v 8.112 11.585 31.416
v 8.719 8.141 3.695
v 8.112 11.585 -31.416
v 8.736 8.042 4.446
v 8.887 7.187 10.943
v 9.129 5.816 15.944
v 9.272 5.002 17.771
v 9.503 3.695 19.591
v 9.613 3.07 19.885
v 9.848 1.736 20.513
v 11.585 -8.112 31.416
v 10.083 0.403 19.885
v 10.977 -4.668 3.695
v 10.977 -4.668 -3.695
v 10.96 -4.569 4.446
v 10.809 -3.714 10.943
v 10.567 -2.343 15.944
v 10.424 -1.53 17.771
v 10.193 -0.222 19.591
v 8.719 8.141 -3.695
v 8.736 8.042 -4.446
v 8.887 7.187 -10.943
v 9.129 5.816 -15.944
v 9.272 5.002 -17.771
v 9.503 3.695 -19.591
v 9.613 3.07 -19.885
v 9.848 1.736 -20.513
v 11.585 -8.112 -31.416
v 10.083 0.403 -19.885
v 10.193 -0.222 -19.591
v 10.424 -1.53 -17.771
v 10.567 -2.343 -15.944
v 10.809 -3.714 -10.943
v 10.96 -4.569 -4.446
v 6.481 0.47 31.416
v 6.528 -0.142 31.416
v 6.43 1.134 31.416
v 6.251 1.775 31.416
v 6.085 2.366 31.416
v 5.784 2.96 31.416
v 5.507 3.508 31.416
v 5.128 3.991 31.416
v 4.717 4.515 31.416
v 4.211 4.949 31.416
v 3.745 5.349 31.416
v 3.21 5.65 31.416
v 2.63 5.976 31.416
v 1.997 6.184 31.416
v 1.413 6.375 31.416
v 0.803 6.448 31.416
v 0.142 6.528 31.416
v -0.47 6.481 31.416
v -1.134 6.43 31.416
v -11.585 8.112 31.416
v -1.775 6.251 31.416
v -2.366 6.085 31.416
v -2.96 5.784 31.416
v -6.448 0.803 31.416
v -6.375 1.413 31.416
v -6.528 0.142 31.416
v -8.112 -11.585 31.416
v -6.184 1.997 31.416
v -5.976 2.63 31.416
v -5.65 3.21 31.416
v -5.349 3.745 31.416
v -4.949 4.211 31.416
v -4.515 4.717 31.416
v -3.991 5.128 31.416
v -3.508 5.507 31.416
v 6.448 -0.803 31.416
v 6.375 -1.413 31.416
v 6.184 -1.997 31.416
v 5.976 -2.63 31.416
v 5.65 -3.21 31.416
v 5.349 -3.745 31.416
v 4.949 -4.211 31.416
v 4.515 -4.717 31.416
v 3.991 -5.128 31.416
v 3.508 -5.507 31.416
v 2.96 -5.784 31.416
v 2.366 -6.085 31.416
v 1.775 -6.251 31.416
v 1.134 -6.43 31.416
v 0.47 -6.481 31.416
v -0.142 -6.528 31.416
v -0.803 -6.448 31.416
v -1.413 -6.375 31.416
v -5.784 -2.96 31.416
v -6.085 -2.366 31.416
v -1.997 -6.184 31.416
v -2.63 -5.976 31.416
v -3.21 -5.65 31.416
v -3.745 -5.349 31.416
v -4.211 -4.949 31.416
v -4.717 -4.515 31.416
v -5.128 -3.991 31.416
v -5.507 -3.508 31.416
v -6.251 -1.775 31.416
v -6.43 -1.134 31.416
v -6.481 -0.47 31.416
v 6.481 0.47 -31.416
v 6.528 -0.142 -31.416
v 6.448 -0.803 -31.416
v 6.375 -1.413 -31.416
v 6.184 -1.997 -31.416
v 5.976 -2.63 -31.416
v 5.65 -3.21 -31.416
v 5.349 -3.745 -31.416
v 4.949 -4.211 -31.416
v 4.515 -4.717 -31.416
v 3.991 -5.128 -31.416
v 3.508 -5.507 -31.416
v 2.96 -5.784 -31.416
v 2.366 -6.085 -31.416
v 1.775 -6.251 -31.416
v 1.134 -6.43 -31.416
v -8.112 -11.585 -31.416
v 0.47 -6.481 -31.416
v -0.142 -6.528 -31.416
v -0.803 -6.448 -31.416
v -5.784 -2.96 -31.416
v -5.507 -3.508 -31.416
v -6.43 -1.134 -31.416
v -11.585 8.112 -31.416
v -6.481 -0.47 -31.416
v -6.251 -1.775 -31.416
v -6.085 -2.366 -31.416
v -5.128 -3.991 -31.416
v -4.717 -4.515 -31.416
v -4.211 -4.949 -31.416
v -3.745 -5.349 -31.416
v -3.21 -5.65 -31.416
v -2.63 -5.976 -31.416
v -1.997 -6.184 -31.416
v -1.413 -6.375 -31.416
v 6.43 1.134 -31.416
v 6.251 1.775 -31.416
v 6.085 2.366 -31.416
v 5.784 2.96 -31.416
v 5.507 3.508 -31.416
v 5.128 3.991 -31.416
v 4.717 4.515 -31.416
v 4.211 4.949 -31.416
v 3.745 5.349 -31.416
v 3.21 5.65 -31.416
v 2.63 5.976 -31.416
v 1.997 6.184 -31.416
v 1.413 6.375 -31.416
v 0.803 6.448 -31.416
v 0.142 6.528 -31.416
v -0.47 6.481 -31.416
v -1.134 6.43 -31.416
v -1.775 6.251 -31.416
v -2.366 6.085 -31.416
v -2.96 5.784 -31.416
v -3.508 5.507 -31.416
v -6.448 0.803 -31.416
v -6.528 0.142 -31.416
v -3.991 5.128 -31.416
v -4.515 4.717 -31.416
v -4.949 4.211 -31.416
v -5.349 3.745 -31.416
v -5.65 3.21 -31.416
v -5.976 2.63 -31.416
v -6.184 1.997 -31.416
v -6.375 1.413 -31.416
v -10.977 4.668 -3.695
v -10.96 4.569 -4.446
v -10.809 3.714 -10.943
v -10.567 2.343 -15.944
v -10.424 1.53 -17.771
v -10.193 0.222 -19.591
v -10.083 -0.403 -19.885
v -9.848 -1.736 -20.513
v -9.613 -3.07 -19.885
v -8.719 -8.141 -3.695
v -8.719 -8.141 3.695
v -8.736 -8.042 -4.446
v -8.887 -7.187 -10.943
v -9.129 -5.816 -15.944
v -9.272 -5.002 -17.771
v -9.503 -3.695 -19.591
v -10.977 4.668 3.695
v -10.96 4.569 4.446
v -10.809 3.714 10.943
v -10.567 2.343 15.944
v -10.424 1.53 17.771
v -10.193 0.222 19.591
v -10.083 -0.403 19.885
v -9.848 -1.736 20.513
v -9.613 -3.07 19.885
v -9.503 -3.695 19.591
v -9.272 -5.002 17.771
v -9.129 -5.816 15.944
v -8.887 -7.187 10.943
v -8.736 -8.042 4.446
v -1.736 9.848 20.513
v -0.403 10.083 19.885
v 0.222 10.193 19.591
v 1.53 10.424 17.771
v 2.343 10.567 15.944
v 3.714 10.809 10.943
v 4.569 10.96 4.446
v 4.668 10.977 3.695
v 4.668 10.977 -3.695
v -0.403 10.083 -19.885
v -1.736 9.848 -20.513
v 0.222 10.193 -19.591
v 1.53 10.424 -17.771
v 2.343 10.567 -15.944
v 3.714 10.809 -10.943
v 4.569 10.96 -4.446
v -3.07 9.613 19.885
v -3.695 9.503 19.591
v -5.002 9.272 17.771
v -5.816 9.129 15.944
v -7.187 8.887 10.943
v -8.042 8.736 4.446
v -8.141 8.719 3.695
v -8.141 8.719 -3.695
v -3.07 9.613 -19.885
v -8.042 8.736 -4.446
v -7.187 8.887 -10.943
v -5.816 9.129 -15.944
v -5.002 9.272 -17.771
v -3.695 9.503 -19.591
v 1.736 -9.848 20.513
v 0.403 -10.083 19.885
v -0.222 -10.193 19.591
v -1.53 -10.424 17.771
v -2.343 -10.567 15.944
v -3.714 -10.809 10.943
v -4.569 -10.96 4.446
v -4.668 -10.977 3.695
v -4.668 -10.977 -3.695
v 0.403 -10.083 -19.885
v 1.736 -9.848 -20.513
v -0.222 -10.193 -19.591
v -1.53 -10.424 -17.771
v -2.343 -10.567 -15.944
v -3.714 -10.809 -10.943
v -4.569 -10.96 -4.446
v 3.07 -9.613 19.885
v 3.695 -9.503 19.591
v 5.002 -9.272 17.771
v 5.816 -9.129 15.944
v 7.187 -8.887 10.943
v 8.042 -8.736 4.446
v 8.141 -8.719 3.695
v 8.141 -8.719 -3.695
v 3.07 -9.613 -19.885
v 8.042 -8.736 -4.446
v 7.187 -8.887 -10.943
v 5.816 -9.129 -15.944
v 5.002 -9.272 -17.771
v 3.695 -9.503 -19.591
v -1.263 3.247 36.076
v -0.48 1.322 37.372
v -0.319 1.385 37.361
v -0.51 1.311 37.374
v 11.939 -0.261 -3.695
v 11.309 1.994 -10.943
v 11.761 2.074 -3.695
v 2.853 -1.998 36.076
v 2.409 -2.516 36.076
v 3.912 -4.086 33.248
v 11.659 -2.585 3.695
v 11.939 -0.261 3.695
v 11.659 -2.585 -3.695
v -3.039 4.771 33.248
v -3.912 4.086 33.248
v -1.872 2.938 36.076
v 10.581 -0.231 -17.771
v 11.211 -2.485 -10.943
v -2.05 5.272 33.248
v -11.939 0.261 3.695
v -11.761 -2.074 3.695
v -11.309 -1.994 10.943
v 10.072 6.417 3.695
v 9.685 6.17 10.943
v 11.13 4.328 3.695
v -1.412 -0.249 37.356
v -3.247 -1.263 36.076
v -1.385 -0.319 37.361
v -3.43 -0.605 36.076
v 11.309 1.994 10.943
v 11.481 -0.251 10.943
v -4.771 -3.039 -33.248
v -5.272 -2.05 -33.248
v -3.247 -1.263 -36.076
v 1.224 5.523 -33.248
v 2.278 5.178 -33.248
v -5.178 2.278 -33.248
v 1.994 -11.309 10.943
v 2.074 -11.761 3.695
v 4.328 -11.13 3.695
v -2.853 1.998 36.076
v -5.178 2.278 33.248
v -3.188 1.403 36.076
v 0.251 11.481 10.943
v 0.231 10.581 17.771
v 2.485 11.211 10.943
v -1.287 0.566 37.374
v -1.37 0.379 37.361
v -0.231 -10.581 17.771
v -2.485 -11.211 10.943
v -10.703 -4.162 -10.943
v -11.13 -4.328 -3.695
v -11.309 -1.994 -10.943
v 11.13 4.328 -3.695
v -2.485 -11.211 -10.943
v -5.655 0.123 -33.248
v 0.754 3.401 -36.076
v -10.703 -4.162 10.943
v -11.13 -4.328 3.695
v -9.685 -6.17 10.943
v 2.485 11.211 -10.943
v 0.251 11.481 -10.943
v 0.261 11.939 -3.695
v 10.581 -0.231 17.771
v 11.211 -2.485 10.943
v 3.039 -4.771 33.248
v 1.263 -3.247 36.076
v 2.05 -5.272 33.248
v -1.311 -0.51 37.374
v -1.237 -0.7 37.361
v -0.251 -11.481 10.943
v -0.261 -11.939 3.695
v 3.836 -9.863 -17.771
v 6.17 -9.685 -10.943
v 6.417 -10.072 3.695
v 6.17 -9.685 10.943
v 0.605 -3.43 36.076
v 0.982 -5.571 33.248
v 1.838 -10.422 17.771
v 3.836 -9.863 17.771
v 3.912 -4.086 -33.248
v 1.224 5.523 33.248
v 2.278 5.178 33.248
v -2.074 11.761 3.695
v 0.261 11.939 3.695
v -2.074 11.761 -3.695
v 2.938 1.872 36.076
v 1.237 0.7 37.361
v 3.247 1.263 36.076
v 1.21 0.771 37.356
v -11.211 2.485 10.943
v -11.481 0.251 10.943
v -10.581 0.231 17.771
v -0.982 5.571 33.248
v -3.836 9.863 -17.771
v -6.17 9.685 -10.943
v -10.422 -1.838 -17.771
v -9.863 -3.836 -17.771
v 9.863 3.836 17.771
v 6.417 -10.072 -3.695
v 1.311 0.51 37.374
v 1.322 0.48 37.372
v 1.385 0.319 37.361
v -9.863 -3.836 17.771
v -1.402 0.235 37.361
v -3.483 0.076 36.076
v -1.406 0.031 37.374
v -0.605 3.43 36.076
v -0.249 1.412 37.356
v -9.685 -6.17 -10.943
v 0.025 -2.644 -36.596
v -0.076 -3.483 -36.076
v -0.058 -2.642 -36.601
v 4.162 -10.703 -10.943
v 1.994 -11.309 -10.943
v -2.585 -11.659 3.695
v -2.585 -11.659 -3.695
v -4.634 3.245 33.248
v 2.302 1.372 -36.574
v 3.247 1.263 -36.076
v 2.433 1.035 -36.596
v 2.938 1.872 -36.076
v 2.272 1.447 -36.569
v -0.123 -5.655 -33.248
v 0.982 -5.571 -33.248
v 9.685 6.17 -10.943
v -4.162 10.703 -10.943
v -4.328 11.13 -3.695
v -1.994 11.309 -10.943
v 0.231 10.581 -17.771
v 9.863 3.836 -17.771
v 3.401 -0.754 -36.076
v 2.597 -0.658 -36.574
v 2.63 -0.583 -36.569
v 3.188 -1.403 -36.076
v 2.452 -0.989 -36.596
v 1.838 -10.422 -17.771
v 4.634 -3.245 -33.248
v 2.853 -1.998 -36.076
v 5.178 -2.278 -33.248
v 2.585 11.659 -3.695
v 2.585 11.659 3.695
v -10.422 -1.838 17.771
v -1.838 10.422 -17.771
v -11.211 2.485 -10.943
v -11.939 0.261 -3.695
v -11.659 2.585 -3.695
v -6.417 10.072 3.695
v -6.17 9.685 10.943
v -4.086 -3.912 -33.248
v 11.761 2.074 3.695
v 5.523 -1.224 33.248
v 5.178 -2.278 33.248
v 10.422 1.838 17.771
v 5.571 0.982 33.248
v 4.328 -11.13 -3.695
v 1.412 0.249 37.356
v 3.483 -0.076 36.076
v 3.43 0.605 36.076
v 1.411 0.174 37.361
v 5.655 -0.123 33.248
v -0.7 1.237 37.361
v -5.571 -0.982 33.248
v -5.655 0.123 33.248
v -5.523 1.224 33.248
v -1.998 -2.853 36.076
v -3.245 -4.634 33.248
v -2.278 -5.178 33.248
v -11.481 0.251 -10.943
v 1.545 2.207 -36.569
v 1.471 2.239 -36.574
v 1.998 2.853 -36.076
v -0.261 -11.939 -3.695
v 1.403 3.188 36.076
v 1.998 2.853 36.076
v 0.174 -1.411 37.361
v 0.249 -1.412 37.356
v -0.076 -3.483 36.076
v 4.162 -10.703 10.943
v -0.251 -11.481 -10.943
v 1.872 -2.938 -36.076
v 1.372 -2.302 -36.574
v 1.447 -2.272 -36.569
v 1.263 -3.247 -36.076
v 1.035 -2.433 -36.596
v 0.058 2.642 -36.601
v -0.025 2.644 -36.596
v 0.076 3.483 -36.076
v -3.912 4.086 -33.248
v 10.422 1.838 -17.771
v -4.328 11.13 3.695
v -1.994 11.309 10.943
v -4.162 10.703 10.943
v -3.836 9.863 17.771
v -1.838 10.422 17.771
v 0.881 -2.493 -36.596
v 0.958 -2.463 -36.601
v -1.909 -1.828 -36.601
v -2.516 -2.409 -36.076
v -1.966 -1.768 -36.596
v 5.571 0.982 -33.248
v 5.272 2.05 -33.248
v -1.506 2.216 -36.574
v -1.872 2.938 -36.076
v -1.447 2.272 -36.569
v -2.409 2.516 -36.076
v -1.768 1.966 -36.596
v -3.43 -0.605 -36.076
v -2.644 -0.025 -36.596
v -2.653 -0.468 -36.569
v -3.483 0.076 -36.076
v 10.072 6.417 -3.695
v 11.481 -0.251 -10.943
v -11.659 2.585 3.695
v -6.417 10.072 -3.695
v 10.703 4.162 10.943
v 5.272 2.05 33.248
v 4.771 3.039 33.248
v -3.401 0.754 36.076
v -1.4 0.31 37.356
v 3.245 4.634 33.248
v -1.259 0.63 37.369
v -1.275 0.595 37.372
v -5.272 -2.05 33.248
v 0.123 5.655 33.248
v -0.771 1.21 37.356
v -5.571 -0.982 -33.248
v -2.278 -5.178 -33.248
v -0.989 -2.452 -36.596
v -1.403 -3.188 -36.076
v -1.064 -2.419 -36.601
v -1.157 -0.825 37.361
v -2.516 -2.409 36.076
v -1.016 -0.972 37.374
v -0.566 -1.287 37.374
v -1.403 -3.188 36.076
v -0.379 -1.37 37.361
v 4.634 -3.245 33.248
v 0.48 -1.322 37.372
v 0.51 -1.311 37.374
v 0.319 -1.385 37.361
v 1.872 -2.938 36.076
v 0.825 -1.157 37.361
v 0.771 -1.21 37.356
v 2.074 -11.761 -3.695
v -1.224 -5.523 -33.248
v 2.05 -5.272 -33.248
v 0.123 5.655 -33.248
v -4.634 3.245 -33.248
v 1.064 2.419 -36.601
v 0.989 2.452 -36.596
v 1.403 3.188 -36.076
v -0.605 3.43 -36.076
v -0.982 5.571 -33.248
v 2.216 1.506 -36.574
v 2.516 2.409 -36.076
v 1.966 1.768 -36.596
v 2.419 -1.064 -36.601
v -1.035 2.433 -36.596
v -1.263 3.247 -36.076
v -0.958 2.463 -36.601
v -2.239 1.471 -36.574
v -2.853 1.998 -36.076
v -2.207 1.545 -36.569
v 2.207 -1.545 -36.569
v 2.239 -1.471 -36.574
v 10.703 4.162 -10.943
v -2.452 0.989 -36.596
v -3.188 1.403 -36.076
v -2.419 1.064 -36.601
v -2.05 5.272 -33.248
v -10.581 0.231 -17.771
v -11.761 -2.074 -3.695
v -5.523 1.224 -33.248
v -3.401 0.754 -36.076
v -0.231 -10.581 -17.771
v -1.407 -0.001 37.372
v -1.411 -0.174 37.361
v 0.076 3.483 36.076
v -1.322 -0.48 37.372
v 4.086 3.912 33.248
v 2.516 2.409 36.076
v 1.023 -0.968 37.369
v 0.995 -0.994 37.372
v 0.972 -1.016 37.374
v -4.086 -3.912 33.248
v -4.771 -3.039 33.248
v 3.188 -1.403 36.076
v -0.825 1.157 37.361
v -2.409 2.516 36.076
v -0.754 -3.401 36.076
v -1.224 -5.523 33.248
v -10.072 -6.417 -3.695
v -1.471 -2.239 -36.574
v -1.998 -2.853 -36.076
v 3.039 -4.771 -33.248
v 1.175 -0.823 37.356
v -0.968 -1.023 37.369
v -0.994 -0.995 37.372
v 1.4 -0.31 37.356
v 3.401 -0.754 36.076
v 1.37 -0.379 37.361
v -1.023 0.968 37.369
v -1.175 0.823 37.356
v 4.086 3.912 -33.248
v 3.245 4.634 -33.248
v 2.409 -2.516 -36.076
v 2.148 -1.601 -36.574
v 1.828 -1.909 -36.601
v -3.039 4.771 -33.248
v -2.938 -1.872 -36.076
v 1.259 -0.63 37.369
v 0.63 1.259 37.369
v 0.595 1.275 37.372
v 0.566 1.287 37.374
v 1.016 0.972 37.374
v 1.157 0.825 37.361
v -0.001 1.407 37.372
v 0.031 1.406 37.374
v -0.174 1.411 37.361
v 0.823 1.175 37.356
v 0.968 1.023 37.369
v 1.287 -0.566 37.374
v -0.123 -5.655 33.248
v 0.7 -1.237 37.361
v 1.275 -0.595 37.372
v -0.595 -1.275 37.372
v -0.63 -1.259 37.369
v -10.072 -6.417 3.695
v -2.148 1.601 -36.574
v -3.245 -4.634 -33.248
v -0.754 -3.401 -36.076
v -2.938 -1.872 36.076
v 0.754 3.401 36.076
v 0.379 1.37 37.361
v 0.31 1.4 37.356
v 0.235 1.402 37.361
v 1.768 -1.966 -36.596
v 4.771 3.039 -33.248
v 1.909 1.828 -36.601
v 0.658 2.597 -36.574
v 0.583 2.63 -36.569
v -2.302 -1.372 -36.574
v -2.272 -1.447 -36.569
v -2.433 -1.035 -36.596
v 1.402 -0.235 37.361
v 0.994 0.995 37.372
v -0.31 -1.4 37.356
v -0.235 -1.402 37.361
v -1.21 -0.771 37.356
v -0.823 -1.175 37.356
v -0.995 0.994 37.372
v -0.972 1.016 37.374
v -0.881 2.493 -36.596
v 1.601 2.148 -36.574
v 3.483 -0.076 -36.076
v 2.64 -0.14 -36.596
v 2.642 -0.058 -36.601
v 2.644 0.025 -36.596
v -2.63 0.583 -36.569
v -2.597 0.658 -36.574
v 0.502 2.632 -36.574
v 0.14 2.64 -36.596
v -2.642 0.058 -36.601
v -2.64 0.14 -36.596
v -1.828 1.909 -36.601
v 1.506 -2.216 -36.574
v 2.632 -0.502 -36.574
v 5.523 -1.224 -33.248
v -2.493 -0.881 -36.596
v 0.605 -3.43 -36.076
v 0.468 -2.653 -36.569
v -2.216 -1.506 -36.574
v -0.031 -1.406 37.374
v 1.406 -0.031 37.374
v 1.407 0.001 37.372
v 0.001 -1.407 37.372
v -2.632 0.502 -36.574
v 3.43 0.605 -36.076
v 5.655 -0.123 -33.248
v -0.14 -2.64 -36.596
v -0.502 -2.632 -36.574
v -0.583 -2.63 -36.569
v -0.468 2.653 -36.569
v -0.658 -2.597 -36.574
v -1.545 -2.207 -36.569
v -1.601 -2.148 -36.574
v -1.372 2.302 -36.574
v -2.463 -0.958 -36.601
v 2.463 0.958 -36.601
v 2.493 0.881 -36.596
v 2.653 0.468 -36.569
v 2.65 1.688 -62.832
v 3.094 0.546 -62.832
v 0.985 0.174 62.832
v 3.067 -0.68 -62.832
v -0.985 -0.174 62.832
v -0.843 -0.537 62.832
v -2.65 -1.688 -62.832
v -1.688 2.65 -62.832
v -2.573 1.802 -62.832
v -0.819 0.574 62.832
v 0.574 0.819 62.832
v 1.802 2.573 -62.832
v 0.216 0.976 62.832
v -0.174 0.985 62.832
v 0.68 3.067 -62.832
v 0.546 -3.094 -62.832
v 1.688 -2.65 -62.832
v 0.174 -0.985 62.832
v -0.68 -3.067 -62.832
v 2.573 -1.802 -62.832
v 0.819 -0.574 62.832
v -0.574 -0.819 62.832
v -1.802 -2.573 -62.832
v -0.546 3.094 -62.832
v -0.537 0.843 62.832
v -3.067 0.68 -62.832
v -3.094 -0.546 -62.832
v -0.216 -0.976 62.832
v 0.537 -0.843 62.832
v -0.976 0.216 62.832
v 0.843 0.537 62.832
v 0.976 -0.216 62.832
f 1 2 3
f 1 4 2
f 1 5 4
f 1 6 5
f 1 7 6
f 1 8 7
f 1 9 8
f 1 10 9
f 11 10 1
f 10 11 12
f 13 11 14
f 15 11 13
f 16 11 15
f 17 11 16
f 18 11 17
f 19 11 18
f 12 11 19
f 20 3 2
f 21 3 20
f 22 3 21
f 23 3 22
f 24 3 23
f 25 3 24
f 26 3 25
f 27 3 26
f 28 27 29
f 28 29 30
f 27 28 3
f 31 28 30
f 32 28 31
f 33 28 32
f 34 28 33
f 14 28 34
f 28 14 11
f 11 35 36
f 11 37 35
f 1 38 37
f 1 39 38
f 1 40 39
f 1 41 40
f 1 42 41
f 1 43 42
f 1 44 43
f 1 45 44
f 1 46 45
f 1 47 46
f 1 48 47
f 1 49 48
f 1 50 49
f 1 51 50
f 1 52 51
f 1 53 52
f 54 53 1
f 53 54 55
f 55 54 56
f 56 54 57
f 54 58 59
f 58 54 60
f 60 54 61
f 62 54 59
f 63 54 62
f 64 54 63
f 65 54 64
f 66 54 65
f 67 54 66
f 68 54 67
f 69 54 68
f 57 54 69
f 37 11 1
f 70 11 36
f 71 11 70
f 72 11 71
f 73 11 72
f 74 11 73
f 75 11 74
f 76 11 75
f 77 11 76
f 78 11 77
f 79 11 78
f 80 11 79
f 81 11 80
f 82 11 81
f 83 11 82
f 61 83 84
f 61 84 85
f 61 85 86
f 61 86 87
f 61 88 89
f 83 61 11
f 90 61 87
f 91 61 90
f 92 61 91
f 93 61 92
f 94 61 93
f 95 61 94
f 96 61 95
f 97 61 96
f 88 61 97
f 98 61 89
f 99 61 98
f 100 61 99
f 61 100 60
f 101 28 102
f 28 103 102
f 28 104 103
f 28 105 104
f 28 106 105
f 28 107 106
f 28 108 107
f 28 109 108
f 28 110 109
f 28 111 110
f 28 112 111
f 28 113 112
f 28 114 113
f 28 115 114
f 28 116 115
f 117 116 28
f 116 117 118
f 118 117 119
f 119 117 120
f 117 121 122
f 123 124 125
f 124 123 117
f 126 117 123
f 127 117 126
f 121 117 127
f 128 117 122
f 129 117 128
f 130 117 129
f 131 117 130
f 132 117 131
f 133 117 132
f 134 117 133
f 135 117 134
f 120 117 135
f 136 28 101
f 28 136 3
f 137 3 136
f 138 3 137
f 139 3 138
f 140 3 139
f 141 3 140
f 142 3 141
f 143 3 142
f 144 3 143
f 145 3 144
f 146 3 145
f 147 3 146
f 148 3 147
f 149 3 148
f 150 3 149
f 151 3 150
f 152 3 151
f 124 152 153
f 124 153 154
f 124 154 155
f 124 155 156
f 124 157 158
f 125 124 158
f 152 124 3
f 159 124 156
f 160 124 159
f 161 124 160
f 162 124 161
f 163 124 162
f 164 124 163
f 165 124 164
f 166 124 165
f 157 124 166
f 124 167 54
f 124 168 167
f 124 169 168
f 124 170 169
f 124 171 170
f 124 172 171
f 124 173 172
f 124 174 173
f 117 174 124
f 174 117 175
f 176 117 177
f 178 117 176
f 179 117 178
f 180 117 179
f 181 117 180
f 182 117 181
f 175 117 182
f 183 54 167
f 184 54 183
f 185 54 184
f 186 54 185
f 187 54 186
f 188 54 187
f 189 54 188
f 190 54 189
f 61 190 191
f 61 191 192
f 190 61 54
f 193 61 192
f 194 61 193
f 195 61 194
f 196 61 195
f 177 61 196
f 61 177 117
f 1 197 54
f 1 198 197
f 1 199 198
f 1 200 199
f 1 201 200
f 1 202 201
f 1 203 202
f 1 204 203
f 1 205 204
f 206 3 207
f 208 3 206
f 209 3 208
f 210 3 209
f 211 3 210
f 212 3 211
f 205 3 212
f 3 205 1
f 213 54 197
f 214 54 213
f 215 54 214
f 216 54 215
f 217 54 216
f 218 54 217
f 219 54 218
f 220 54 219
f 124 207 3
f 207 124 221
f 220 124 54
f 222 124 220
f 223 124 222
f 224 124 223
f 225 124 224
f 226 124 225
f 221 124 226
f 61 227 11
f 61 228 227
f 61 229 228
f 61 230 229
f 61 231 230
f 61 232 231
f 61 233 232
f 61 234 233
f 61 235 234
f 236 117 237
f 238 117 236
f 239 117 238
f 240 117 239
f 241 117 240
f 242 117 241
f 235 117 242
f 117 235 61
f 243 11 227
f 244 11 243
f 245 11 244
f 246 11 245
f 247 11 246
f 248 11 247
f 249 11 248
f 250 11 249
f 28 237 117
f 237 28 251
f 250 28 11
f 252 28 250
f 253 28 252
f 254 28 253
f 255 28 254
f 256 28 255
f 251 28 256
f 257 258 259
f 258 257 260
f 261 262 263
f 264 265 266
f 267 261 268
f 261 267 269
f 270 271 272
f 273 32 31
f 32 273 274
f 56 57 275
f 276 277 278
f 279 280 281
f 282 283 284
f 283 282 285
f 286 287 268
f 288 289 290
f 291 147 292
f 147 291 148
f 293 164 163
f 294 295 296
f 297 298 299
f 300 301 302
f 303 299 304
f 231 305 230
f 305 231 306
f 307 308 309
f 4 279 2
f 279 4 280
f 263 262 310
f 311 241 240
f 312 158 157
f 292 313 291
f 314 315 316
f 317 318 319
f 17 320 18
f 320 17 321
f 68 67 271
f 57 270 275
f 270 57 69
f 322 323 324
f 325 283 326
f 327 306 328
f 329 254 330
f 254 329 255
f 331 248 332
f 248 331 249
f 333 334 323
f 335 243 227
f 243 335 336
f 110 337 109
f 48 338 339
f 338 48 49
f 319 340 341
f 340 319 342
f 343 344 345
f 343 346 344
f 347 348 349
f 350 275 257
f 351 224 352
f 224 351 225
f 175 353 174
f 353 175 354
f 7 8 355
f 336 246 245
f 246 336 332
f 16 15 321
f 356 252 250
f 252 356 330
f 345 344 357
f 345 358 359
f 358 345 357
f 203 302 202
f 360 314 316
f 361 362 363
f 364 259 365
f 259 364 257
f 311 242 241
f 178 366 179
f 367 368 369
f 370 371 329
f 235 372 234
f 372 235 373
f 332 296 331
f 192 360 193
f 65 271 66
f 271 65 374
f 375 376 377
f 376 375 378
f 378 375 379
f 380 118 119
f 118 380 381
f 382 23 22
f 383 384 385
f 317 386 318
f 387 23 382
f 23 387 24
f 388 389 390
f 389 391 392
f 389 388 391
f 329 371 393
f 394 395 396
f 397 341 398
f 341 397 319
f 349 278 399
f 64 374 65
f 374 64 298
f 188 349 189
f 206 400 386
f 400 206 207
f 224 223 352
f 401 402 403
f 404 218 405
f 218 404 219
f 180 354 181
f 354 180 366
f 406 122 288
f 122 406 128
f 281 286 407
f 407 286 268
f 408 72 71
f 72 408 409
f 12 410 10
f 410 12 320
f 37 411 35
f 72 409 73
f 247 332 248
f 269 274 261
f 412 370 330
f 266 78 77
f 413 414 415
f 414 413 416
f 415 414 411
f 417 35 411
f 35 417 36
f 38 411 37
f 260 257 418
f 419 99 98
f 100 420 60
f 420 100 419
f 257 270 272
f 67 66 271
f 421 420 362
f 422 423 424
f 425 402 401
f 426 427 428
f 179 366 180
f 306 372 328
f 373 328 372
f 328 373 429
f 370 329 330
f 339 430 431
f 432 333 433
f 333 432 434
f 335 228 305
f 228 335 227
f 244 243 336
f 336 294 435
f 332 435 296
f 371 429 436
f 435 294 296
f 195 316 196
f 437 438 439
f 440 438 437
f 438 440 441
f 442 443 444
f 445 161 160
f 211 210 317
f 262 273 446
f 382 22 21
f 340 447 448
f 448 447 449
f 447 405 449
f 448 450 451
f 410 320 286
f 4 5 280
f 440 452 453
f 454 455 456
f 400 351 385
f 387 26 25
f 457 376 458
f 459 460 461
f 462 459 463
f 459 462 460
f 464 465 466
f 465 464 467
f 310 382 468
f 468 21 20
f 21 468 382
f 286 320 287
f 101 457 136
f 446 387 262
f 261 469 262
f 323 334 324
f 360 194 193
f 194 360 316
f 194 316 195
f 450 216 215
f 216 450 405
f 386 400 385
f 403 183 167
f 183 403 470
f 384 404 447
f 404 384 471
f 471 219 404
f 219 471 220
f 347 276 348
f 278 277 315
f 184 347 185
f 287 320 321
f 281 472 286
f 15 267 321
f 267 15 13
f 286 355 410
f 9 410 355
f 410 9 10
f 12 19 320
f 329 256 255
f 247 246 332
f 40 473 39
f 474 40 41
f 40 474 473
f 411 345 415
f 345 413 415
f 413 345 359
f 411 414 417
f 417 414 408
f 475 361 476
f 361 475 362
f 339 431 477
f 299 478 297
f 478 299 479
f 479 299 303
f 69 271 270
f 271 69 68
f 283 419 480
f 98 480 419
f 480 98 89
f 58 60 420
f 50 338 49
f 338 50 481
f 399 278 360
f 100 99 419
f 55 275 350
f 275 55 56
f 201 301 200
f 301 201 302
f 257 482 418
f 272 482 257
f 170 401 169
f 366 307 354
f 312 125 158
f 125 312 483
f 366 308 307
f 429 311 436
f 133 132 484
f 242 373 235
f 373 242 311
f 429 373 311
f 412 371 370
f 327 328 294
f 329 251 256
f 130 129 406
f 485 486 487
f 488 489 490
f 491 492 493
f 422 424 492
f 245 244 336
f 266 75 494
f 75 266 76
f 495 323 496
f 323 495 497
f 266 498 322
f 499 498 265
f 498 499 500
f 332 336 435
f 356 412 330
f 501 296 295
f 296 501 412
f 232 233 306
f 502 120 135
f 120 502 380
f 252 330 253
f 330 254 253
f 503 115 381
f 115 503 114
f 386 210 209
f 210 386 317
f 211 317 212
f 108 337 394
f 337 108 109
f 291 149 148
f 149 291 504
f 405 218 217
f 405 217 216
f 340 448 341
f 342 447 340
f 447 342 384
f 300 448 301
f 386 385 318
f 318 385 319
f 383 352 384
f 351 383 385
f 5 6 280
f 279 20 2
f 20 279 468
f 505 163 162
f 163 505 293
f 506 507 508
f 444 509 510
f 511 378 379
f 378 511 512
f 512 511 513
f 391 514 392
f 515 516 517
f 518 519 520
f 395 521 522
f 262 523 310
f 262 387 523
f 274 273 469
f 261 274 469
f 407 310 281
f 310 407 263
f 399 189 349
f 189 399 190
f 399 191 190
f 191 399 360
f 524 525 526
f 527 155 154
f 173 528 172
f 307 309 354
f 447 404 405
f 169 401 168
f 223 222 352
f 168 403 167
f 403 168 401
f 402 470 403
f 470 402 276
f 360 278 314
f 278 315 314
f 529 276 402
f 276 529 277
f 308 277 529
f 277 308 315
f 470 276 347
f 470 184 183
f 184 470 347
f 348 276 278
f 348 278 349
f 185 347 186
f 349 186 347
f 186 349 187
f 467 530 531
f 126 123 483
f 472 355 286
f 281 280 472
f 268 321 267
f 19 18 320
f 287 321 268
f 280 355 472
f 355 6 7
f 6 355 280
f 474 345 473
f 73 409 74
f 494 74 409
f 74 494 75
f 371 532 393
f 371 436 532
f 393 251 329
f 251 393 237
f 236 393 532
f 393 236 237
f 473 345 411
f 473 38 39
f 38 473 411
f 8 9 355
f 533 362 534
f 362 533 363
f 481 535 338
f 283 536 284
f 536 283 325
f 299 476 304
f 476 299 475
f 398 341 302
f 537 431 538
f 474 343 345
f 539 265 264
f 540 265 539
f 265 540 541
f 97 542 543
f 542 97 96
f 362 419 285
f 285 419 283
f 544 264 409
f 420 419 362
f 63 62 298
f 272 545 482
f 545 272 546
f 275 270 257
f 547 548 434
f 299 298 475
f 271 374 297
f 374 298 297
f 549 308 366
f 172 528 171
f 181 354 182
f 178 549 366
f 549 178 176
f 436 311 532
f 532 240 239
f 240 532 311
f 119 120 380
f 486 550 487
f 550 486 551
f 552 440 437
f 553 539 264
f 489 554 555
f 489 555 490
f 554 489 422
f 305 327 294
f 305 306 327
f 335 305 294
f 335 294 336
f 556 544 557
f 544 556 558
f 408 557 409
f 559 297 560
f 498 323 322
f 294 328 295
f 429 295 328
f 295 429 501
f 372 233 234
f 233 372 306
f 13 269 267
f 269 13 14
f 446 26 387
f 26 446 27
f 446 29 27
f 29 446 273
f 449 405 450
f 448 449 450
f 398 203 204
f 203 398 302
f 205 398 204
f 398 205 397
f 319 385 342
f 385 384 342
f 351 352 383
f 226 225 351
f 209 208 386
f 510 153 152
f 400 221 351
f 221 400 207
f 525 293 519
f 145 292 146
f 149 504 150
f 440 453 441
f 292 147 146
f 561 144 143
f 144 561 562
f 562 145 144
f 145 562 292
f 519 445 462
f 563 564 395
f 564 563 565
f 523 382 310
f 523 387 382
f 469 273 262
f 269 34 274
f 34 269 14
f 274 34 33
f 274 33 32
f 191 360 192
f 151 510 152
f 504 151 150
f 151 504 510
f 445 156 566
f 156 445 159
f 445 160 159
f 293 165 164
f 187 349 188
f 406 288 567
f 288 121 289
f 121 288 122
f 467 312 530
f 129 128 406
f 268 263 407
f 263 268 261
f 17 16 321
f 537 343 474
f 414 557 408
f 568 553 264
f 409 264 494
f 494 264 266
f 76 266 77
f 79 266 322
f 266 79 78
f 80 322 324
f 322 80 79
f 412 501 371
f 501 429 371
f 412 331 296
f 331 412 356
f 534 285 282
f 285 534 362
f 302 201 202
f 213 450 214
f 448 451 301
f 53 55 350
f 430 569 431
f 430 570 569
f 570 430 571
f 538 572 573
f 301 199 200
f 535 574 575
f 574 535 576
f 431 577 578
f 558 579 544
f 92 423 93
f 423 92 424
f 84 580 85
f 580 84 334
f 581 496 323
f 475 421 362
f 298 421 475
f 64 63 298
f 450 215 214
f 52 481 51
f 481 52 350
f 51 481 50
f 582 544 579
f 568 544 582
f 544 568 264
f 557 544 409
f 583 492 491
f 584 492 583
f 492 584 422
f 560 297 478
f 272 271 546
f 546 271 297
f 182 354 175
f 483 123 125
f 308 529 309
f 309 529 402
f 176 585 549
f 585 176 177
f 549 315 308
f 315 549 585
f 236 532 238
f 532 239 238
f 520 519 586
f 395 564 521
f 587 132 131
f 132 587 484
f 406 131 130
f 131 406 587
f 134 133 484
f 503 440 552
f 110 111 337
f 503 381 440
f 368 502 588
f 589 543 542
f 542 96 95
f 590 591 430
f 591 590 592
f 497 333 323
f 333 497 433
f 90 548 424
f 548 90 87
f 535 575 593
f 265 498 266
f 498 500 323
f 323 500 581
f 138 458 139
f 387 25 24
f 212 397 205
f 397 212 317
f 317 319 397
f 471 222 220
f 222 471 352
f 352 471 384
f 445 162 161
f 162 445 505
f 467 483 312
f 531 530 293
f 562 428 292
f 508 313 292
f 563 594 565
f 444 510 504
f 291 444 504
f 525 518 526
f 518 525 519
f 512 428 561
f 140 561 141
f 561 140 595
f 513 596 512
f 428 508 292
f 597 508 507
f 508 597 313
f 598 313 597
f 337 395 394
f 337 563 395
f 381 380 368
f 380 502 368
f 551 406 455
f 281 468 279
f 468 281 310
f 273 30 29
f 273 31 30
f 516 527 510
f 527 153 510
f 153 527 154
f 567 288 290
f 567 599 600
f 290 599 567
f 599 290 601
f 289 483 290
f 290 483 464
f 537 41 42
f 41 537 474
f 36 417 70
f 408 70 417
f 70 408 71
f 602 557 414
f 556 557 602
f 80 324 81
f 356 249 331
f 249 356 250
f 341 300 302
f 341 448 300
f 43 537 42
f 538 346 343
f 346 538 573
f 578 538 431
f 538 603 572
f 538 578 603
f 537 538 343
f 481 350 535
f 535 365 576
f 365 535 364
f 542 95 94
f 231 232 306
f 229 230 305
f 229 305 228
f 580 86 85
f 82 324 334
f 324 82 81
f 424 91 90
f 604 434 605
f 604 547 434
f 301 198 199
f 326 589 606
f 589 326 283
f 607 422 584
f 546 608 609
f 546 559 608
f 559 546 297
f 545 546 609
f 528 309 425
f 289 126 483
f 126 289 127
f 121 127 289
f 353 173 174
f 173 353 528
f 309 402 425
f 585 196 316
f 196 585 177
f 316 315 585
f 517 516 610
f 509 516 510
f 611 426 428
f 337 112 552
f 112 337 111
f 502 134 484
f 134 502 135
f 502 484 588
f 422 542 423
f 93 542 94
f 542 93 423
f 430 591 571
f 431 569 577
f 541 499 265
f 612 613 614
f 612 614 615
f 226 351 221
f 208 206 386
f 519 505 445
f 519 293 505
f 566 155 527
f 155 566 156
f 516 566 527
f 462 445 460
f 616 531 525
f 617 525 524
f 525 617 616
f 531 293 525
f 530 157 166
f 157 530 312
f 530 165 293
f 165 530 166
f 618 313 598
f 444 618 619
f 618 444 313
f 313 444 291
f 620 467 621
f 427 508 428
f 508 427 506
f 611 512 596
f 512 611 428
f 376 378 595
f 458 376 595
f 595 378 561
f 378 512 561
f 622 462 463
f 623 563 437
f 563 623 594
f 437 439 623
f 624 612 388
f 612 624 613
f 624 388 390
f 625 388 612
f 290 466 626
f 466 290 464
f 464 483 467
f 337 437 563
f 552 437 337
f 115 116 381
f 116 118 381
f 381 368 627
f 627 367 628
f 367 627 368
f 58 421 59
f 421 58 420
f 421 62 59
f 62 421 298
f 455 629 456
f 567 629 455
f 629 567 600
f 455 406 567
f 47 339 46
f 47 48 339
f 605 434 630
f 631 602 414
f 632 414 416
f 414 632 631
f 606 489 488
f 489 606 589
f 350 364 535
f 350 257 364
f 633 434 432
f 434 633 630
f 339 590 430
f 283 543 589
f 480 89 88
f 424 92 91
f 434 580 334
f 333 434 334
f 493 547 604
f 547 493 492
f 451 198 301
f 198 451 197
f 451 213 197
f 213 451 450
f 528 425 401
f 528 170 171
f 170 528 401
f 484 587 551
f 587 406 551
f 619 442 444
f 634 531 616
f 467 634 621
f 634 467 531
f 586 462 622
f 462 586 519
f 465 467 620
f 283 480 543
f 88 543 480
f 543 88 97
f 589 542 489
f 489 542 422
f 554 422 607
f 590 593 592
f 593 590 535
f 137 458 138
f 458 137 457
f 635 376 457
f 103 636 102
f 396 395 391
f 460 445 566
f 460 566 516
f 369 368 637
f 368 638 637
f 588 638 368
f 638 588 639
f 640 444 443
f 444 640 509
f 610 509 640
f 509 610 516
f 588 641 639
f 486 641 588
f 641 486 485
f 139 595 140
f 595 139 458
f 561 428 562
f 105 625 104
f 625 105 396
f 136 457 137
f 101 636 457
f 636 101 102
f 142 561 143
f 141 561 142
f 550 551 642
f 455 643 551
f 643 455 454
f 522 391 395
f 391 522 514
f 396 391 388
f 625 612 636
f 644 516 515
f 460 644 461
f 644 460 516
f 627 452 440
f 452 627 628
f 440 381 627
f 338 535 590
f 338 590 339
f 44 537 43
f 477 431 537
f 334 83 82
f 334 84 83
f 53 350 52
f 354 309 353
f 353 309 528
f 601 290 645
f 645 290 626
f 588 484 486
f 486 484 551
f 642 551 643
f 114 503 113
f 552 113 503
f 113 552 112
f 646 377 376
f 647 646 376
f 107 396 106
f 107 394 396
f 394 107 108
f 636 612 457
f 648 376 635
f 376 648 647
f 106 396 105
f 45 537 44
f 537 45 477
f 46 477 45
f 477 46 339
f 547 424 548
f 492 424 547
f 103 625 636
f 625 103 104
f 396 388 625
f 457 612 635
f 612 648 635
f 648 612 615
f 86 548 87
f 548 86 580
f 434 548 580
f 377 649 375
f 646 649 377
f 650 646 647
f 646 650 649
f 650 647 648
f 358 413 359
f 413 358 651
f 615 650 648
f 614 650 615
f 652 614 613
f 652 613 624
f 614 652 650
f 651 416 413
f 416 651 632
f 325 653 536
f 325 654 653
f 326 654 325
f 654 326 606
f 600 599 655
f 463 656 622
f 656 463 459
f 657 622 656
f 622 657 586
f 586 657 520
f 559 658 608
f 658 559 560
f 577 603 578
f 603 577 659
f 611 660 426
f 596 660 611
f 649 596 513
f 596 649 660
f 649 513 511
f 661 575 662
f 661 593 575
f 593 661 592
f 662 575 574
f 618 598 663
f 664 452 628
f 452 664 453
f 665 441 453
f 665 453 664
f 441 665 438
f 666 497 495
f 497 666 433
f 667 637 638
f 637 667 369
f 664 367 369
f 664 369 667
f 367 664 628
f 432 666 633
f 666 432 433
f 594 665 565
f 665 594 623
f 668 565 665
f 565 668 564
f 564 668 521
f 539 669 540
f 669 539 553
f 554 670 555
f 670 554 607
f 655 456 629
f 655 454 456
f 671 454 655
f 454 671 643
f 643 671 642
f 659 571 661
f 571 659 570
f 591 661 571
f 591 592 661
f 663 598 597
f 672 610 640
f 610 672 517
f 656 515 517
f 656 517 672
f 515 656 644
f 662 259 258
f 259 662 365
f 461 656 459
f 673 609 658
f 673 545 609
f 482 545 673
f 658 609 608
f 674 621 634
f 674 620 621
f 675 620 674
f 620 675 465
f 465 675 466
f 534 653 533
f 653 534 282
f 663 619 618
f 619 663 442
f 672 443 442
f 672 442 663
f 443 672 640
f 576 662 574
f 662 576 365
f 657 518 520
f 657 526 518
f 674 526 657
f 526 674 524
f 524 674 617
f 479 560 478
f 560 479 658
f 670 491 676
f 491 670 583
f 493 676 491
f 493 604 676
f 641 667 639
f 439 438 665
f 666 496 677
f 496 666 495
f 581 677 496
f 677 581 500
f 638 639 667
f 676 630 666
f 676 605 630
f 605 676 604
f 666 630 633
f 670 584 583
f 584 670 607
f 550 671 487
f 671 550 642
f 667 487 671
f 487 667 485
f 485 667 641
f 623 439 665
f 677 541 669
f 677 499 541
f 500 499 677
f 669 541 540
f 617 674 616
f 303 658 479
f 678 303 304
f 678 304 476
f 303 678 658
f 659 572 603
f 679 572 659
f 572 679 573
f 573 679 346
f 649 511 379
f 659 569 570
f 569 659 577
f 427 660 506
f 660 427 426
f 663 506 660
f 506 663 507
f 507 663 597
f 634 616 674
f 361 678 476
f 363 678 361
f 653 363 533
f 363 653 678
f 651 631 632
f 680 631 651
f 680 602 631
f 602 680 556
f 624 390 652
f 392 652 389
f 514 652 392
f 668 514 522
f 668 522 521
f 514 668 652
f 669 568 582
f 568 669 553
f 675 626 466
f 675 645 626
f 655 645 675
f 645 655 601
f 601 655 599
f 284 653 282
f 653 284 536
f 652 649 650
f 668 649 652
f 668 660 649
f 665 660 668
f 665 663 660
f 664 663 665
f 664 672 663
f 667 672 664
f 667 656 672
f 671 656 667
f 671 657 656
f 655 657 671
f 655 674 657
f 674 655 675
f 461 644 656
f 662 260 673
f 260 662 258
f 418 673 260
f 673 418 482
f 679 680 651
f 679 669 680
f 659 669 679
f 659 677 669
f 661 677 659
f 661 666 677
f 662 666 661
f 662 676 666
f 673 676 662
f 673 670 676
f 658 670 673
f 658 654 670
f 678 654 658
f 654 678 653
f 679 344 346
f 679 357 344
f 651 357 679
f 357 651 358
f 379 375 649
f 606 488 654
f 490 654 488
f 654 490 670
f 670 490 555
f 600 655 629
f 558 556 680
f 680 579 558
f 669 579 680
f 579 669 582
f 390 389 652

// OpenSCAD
rotate(a = 10) multmatrix([[1,0,0,0],[0,1,0,0],[0.0,0,PI,0]]) {
    group() {
        cube(20, center = true);
        sphere(12, $fn = 32);
        cylinder(40, PI, center = true, $fn = 16);
    }
}
